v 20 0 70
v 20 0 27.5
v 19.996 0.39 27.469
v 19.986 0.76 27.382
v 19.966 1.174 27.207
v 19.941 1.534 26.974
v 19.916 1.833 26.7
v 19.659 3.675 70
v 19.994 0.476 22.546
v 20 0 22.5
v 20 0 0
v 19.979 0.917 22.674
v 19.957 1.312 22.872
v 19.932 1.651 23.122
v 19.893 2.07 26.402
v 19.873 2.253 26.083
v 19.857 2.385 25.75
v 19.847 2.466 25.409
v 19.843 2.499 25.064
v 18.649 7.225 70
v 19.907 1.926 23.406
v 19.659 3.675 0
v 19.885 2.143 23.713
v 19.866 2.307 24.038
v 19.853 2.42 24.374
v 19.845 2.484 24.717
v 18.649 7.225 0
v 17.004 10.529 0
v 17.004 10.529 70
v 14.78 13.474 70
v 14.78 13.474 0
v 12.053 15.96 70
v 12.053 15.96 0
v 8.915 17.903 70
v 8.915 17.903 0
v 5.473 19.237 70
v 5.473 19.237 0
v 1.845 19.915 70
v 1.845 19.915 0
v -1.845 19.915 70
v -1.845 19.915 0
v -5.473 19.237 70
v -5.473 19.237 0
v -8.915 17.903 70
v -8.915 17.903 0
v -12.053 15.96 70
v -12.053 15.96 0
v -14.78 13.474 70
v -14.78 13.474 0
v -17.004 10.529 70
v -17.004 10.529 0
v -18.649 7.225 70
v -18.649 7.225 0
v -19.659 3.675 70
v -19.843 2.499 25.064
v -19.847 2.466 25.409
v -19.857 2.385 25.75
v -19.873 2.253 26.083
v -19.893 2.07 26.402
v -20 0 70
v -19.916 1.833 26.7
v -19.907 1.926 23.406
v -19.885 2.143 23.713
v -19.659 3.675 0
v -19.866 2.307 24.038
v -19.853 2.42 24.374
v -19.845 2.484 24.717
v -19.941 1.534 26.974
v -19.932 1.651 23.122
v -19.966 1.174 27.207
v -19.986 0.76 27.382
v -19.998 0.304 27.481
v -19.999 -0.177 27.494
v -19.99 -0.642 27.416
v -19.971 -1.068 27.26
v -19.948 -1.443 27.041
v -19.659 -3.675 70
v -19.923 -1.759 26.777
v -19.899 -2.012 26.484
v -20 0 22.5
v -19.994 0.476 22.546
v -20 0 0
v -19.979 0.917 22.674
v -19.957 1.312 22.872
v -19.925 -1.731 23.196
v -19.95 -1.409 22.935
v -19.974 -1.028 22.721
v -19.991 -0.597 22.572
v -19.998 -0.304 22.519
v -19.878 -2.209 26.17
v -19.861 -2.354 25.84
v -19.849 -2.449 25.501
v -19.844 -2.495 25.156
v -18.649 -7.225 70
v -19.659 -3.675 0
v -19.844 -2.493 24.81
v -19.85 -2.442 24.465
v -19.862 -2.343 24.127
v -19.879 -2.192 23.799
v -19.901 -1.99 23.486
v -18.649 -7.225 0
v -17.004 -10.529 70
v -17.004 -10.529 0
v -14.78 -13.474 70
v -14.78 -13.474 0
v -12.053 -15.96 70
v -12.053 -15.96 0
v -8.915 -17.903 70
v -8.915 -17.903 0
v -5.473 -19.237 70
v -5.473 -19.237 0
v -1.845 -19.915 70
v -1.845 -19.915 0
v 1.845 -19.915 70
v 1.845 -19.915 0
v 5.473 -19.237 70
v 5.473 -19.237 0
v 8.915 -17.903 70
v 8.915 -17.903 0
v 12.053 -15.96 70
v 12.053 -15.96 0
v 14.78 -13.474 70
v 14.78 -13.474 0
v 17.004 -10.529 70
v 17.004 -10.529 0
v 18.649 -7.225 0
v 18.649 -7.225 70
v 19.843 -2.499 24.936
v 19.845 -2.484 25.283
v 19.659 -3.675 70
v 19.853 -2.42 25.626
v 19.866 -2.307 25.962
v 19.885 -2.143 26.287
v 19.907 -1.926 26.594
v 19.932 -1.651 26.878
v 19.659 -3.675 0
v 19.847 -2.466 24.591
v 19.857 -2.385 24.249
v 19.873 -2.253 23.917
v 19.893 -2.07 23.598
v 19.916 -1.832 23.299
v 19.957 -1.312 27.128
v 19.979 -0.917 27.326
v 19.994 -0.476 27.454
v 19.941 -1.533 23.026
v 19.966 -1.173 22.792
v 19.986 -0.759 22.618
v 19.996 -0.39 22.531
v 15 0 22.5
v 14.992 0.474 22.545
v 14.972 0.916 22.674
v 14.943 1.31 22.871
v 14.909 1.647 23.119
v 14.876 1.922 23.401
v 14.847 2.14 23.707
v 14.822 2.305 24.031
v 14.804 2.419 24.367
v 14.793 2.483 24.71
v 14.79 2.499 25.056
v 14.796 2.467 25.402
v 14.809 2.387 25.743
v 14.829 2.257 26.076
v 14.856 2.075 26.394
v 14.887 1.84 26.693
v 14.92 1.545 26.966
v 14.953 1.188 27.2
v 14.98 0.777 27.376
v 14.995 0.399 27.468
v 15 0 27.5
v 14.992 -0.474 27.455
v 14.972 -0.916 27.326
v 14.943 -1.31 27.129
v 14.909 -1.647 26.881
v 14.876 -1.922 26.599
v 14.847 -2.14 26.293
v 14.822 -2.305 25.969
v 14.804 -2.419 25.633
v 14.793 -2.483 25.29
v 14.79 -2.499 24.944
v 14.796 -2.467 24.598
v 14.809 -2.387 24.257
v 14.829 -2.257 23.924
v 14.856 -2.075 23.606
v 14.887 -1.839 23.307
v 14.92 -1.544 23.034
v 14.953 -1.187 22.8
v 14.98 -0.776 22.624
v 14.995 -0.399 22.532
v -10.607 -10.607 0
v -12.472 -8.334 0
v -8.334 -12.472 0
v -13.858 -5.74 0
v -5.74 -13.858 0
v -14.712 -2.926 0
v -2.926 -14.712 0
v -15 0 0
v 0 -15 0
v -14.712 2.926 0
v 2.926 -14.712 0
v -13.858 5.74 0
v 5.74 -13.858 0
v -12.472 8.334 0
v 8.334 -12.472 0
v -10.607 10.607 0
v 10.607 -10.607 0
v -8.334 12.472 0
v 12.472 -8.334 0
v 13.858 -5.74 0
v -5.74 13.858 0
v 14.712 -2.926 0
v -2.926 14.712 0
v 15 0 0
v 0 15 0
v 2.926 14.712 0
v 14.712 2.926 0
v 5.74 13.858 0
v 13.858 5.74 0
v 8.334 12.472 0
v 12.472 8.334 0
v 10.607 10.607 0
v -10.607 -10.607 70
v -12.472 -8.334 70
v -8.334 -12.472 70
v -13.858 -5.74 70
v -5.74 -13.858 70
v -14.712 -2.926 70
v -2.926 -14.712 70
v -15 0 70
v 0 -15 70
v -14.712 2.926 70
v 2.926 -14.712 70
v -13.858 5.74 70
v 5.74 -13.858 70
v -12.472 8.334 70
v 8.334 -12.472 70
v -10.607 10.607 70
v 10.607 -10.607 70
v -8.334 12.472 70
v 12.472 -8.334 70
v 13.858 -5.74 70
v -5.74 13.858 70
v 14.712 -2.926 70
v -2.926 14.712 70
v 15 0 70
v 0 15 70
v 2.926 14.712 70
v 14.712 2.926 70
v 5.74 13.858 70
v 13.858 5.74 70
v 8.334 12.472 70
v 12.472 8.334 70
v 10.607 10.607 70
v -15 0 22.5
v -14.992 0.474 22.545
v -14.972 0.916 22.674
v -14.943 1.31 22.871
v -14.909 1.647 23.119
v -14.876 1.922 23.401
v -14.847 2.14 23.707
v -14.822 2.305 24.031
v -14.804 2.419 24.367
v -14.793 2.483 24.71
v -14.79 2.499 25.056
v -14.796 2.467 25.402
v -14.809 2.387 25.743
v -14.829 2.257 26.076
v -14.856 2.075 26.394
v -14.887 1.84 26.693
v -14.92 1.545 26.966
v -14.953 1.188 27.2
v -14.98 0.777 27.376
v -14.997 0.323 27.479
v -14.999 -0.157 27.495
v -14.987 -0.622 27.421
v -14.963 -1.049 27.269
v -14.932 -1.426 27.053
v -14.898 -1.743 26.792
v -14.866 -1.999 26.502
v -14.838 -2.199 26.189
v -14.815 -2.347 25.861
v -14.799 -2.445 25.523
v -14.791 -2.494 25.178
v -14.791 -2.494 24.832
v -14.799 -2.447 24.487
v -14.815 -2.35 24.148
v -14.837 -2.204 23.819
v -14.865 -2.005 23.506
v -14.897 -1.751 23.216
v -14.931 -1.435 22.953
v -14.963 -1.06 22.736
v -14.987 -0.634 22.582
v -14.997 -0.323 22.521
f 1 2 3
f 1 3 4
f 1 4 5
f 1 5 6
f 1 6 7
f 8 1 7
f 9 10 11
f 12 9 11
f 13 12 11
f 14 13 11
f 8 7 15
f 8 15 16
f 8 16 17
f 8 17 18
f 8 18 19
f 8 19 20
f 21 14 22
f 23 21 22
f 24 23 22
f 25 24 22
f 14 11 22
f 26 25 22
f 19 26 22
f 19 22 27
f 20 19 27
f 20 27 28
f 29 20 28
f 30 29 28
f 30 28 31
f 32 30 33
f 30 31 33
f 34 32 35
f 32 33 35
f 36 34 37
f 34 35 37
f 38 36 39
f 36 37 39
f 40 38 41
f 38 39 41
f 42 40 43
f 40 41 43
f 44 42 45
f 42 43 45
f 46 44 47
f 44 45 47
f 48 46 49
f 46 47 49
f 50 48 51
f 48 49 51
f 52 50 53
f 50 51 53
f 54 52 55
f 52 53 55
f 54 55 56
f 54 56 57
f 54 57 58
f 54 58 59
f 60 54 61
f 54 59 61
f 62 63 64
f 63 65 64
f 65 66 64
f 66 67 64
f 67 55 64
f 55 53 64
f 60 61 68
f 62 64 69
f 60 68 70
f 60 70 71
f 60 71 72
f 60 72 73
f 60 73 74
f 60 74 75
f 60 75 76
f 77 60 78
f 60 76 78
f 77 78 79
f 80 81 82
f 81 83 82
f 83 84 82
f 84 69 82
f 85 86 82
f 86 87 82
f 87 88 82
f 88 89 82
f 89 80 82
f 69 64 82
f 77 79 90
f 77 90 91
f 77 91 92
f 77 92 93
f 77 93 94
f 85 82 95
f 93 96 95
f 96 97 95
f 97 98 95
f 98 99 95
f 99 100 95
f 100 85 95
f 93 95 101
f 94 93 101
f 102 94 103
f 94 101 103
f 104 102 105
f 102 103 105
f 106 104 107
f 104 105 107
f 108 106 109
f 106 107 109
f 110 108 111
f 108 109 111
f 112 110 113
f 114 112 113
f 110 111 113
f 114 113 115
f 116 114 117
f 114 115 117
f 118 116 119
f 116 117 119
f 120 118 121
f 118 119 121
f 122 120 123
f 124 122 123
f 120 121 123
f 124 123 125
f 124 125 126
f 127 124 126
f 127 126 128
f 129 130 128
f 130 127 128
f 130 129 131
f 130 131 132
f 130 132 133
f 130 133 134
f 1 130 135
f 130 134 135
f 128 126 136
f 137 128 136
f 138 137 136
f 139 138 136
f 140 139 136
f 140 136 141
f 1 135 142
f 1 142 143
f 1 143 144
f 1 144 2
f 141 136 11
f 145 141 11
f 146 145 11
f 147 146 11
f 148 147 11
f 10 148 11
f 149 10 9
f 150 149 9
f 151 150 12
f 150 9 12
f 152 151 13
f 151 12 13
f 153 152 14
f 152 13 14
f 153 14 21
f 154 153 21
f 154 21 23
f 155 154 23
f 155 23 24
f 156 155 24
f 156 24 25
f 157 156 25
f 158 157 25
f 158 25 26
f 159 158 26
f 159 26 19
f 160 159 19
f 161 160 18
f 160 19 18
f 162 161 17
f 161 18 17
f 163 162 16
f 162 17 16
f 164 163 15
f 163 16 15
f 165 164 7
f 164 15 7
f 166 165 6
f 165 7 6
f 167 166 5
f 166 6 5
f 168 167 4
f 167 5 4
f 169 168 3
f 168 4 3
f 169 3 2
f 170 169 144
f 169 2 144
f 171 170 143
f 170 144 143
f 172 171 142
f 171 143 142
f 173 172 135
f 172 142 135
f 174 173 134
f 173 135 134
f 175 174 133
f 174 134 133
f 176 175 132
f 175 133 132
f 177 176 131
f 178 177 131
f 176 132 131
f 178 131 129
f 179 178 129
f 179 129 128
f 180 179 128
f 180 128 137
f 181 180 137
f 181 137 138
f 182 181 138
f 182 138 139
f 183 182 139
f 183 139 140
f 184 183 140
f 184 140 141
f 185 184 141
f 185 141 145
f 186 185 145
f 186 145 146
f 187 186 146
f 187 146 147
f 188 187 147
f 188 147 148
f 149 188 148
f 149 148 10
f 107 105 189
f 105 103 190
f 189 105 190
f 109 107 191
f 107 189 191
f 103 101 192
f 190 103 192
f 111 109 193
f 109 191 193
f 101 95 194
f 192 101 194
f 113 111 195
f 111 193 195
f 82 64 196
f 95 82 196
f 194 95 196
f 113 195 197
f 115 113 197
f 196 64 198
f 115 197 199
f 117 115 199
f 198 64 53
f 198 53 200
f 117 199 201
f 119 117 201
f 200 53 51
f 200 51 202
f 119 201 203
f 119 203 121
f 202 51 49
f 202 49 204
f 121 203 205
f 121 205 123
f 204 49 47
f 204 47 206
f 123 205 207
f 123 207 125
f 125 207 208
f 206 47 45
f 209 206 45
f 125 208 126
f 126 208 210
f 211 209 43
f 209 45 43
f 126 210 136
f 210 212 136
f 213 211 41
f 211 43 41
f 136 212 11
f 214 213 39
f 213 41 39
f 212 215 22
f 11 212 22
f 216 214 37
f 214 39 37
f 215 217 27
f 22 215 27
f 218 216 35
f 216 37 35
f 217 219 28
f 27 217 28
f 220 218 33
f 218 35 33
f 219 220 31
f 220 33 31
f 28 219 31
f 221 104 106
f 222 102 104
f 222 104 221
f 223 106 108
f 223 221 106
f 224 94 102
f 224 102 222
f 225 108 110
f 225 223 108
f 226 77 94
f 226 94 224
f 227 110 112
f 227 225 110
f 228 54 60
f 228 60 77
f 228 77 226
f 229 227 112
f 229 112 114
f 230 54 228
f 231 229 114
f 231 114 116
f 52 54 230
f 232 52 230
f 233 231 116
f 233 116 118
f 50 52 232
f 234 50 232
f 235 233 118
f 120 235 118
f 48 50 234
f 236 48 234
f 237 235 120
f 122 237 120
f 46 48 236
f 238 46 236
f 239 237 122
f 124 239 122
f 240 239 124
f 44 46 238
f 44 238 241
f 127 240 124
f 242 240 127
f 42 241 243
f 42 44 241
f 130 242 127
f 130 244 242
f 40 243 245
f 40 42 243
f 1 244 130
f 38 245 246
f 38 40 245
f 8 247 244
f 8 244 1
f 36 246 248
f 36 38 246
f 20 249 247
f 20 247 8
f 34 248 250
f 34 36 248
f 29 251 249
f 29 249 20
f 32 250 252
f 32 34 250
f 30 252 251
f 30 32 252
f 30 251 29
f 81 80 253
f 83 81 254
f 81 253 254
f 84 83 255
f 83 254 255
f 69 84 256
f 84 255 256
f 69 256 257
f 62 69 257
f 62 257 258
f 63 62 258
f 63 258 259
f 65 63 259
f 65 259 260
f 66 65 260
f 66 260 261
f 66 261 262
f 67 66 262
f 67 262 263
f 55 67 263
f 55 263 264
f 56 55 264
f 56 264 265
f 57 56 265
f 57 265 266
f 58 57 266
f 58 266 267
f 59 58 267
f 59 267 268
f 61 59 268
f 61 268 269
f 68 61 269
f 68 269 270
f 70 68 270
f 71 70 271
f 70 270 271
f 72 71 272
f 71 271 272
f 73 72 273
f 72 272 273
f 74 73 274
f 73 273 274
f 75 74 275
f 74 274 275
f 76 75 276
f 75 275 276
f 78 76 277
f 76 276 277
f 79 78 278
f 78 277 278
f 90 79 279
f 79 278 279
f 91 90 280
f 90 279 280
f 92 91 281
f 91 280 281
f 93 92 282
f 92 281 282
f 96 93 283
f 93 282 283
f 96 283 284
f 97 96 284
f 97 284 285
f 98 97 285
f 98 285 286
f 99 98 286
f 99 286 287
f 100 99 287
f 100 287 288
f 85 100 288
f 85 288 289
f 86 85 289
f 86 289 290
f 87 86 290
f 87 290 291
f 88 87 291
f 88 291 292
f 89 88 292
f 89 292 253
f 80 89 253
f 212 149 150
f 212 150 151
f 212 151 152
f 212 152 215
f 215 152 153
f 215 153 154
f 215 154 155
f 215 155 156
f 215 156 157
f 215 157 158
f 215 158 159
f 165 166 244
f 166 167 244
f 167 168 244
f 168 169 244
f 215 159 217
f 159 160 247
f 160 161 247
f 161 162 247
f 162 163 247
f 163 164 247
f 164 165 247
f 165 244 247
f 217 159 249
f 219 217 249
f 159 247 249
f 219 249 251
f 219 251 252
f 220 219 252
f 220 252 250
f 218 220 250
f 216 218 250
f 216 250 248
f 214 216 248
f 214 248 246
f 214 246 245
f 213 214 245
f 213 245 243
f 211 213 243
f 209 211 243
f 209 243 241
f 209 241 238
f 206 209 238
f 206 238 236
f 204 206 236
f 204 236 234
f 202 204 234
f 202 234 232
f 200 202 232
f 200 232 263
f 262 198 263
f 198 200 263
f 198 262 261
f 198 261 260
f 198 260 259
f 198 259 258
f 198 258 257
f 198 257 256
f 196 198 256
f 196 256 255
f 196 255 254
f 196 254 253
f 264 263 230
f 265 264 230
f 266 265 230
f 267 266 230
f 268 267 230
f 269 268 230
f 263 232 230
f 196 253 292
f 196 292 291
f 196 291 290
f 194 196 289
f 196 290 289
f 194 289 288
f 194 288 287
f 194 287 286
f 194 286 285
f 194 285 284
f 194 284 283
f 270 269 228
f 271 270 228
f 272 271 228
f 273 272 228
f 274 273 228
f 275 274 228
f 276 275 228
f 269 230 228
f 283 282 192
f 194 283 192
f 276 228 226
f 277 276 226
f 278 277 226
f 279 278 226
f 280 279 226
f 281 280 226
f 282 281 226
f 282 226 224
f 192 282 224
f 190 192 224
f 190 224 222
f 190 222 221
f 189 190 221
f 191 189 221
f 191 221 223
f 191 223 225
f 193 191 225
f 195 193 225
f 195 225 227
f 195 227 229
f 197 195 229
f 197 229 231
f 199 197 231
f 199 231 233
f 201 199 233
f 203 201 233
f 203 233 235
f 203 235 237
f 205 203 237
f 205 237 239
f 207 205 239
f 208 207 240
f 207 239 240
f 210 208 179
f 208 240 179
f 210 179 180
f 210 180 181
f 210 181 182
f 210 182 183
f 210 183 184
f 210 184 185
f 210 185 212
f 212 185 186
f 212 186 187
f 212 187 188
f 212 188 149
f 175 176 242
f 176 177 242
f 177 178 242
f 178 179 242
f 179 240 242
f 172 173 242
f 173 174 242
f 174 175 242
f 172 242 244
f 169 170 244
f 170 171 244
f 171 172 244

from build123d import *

# Parameters (mm, degrees)
SKETCH1_R           = 20
BOSS_EXTRUDE1_DEPTH = 70
SKETCH2_R           = 15
CUT_EXTRUDE1_DEPTH  = 70
SKETCH3_R           = 2.5
CUT_EXTRUDE2_DEPTH  = 53


with BuildPart() as part:
    # Sketch1 → Boss-Extrude1 (new body)
    with BuildSketch(Plane.XY):
        Circle(SKETCH1_R)
    extrude(amount=BOSS_EXTRUDE1_DEPTH)

    # Sketch2 → Cut-Extrude1 (cut)
    with BuildSketch(Plane.XY.offset(70)):
        Circle(SKETCH2_R)
    extrude(amount=-CUT_EXTRUDE1_DEPTH, mode=Mode.SUBTRACT)

    # Sketch3 → Cut-Extrude2 (cut)
    with BuildSketch(Plane(origin=(20, 0, 0), x_dir=(0, 0, -1), z_dir=(1, 0, 0))):
        with Locations((-25, 0)):
            Circle(SKETCH3_R)
    extrude(amount=-CUT_EXTRUDE2_DEPTH, mode=Mode.SUBTRACT)


solid = part.part
